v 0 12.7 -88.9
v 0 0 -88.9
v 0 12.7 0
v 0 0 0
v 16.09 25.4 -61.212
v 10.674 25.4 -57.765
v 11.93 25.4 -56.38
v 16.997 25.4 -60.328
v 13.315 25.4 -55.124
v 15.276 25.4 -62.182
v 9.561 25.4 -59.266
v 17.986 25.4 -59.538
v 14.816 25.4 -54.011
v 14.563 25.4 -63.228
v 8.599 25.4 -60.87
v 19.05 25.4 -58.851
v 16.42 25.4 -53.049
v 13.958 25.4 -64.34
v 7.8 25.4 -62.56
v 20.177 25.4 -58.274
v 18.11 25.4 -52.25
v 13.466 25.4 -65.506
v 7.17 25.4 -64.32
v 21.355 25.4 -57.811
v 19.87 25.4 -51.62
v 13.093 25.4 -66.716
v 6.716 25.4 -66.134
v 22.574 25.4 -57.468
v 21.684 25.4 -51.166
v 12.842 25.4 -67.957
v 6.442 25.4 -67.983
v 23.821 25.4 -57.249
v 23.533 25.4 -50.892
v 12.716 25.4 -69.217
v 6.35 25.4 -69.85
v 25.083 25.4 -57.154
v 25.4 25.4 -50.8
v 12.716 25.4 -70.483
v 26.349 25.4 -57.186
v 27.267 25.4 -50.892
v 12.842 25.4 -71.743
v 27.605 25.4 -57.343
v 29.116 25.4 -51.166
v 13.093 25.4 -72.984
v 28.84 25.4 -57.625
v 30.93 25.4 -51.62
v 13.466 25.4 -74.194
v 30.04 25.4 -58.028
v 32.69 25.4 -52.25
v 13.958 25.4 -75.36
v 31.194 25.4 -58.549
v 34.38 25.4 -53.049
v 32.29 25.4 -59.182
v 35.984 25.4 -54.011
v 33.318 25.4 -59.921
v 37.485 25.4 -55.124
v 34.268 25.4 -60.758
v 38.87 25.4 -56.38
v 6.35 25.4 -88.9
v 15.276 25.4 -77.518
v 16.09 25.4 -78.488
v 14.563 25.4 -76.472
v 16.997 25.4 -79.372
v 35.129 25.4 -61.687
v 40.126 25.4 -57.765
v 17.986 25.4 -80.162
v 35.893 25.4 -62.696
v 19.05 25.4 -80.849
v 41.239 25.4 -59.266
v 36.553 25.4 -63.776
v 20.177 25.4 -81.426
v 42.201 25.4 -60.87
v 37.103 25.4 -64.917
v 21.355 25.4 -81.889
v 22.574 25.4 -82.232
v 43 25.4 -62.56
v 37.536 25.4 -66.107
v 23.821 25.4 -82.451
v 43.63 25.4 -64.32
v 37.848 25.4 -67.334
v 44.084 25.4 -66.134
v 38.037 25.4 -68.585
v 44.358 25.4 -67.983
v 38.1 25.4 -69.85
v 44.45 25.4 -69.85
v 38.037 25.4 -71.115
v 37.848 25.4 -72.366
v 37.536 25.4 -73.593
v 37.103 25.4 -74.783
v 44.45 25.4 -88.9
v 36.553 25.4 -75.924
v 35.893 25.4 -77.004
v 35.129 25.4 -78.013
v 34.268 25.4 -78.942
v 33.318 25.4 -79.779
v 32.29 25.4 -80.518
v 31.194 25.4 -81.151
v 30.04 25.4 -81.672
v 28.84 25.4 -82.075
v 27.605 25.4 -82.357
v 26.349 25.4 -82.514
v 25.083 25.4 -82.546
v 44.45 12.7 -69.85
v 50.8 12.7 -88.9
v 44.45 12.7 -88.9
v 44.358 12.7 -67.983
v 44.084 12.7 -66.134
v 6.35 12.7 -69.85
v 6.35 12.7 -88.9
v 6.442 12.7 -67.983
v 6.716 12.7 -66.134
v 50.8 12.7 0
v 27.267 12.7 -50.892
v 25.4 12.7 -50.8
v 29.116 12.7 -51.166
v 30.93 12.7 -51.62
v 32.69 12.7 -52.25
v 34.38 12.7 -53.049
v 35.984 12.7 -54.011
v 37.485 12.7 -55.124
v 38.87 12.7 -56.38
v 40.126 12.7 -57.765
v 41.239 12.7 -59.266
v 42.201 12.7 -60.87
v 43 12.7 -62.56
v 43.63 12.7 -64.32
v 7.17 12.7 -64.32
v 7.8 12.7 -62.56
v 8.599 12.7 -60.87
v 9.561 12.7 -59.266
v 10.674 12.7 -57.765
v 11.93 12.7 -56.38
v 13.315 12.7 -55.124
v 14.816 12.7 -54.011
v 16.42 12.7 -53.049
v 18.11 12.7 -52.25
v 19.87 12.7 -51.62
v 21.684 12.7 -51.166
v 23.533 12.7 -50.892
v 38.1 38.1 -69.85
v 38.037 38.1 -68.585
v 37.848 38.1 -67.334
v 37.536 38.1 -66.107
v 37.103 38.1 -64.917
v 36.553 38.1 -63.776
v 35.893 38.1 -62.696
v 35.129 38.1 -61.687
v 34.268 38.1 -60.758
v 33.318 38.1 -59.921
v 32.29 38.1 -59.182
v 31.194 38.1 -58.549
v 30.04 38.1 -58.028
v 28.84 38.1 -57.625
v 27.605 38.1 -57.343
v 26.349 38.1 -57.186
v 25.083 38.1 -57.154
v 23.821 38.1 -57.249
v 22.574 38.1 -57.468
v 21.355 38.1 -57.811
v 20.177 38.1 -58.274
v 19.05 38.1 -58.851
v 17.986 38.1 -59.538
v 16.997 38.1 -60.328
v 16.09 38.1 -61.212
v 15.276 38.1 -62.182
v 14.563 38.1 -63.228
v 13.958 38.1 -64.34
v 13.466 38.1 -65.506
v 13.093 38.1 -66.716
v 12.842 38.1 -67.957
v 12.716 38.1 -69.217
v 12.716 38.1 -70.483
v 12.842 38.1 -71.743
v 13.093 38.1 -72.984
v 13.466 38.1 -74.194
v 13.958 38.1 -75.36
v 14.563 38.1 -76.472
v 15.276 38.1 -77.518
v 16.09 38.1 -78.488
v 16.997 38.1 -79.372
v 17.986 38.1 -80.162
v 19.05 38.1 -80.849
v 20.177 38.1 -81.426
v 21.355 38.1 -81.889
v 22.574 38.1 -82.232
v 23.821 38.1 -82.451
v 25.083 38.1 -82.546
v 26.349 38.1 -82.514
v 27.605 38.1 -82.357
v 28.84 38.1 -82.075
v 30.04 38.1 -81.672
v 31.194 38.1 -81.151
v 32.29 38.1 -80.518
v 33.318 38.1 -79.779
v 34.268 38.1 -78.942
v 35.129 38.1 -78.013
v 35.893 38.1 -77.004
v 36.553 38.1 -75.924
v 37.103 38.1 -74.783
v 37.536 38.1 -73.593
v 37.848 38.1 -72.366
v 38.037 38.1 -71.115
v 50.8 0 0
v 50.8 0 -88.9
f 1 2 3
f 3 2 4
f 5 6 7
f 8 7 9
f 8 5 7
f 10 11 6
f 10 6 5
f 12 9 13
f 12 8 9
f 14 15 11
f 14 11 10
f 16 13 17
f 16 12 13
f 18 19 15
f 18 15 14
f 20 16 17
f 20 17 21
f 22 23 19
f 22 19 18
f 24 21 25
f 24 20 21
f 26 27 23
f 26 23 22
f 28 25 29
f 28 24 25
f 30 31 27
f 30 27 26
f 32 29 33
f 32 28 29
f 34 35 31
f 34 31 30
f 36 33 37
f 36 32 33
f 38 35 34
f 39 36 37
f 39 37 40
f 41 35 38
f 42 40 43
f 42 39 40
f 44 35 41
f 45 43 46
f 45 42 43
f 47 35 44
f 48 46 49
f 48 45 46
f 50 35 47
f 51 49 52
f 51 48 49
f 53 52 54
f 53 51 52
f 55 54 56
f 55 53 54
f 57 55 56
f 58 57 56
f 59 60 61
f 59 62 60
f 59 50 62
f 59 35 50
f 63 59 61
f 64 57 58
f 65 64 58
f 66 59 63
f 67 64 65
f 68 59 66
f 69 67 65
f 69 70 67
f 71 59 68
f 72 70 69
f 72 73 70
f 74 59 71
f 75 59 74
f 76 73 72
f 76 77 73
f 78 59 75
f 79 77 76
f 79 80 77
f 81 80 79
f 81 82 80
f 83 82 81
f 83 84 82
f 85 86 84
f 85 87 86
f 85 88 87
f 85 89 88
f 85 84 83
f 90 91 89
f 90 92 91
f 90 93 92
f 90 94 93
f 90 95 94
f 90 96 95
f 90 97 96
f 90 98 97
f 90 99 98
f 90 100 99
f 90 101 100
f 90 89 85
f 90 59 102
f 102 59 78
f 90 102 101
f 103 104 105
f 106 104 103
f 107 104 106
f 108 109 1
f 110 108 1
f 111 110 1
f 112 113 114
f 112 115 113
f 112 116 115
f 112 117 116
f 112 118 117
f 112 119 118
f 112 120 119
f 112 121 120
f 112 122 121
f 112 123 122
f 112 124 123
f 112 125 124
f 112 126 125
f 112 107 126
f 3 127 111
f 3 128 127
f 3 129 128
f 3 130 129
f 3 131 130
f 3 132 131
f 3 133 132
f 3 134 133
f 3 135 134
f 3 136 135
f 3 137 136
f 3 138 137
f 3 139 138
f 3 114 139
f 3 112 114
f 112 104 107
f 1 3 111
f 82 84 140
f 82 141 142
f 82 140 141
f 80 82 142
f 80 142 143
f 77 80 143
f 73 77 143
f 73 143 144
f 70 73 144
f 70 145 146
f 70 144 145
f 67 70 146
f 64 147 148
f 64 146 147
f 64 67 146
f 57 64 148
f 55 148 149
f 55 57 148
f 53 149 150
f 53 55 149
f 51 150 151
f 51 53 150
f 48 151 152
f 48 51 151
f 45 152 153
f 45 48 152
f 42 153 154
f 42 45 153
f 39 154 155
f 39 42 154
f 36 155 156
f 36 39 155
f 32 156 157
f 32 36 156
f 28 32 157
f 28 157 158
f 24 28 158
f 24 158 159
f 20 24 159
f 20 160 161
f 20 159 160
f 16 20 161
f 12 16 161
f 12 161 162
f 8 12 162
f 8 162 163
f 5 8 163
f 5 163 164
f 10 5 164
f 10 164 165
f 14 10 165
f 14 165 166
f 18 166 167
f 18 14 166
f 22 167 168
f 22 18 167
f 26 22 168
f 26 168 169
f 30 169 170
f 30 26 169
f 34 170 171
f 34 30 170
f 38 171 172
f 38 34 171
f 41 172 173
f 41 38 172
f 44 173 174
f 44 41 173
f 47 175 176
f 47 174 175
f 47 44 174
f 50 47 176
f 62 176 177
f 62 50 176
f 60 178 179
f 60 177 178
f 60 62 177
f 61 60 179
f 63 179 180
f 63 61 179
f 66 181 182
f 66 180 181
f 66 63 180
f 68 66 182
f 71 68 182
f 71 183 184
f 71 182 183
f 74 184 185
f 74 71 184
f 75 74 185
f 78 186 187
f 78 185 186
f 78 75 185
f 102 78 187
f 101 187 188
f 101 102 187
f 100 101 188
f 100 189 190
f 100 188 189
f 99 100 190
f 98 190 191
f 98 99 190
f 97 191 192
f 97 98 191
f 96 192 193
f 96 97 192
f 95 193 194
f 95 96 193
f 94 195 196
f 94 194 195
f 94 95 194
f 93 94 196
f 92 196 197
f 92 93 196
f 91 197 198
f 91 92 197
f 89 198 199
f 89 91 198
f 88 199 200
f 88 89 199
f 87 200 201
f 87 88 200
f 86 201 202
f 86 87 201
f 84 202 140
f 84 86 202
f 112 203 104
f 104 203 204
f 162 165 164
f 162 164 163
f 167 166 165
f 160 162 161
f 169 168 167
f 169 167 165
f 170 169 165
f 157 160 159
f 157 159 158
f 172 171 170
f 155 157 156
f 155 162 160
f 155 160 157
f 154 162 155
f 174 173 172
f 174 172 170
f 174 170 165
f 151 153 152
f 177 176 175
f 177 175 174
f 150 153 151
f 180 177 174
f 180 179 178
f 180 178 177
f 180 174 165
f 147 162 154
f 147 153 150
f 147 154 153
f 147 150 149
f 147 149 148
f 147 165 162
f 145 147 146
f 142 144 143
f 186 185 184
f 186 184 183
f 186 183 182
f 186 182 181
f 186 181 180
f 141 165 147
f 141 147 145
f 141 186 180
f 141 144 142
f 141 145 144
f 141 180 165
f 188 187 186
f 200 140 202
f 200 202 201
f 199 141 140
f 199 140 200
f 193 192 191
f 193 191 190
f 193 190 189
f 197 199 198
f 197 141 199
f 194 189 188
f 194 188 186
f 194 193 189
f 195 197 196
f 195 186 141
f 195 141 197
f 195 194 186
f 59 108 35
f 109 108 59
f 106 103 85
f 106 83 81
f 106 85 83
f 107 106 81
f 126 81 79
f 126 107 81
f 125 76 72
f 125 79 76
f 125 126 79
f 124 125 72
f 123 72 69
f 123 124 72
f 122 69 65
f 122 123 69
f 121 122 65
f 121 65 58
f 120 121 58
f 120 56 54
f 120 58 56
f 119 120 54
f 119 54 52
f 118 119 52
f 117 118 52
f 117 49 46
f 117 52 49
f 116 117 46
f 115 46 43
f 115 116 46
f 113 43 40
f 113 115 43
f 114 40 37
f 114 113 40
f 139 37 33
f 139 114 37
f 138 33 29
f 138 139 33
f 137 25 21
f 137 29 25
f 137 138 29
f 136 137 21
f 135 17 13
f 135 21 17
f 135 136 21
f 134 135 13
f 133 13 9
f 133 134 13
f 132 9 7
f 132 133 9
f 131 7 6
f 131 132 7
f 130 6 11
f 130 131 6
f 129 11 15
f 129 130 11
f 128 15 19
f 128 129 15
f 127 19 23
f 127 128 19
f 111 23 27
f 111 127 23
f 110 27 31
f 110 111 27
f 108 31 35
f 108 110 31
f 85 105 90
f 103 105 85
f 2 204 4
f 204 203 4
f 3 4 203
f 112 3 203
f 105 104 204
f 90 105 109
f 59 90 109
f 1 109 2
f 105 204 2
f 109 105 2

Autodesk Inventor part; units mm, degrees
ref_plane "YZ Plane" through (0, 0, 0) normal (1, 0, 0) x (0, 1, 0)
ref_plane "XZ Plane" through (0, 0, 0) normal (0, 1, 0) x (-1, 0, 0)
ref_plane "XY Plane" through (0, 0, 0) normal (0, 0, 1) x (1, 0, 0)
sketch "Sketch1" plane through (0, 0, 0) normal (0, 1, 0) x (-1, 0, 0)
  line L0 (0, 0) -> (-50.8, 0)
  line L1 (-50.8, 0) -> (-50.8, -88.9)
  line L2 (-50.8, -88.9) -> (0, -88.9)
  line L3 (0, -88.9) -> (0, 0)
  dimension "d0" = 50.8
  dimension "d1" = 88.9
extrude "Extrusion1" add sketch "Sketch1" along normal blind 12.7
sketch "Sketch2" plane through (0, 12.7, 0) normal (0, 1, 0) x (1, 0, 0)
  line L0 (50.8, 0) -> (50.8, 88.9) projected
  line L1 (50.8, 88.9) -> (0, 88.9) projected
  line L2 (0, 88.9) -> (0, 0) projected
  line L3 (6.35, 88.9) -> (44.45, 88.9)
  line L4 (44.45, 88.9) -> (44.45, 69.85)
  line L5 (44.45, 69.85) -> (6.35, 69.85)
  line L6 (6.35, 69.85) -> (6.35, 88.9)
  line L7 (6.35, 79.375) -> (0, 79.375) construction
  line L8 (44.45, 79.375) -> (50.8, 79.375) construction
  circle A0 centre (25.4, 69.85) radius 19.05
  dimension "d4" = 19.05
  dimension "d5" = 6.35
extrude "Extrusion2" add sketch "Sketch2" along normal blind 12.7
sketch "Sketch3" plane through (0, 25.4, 0) normal (0, 1, 0) x (1, 0, 0)
  arc A0 (6.35, 69.85) -> (44.45, 69.85) centre (25.4, 69.85) ccw projected
  circle A1 centre (25.4, 69.85) radius 12.7
  point P0 (0, 0)
  dimension "d8" = 25.4
extrude "Extrusion3" add sketch "Sketch3" along normal blind 12.7
properties part number "Holes"
